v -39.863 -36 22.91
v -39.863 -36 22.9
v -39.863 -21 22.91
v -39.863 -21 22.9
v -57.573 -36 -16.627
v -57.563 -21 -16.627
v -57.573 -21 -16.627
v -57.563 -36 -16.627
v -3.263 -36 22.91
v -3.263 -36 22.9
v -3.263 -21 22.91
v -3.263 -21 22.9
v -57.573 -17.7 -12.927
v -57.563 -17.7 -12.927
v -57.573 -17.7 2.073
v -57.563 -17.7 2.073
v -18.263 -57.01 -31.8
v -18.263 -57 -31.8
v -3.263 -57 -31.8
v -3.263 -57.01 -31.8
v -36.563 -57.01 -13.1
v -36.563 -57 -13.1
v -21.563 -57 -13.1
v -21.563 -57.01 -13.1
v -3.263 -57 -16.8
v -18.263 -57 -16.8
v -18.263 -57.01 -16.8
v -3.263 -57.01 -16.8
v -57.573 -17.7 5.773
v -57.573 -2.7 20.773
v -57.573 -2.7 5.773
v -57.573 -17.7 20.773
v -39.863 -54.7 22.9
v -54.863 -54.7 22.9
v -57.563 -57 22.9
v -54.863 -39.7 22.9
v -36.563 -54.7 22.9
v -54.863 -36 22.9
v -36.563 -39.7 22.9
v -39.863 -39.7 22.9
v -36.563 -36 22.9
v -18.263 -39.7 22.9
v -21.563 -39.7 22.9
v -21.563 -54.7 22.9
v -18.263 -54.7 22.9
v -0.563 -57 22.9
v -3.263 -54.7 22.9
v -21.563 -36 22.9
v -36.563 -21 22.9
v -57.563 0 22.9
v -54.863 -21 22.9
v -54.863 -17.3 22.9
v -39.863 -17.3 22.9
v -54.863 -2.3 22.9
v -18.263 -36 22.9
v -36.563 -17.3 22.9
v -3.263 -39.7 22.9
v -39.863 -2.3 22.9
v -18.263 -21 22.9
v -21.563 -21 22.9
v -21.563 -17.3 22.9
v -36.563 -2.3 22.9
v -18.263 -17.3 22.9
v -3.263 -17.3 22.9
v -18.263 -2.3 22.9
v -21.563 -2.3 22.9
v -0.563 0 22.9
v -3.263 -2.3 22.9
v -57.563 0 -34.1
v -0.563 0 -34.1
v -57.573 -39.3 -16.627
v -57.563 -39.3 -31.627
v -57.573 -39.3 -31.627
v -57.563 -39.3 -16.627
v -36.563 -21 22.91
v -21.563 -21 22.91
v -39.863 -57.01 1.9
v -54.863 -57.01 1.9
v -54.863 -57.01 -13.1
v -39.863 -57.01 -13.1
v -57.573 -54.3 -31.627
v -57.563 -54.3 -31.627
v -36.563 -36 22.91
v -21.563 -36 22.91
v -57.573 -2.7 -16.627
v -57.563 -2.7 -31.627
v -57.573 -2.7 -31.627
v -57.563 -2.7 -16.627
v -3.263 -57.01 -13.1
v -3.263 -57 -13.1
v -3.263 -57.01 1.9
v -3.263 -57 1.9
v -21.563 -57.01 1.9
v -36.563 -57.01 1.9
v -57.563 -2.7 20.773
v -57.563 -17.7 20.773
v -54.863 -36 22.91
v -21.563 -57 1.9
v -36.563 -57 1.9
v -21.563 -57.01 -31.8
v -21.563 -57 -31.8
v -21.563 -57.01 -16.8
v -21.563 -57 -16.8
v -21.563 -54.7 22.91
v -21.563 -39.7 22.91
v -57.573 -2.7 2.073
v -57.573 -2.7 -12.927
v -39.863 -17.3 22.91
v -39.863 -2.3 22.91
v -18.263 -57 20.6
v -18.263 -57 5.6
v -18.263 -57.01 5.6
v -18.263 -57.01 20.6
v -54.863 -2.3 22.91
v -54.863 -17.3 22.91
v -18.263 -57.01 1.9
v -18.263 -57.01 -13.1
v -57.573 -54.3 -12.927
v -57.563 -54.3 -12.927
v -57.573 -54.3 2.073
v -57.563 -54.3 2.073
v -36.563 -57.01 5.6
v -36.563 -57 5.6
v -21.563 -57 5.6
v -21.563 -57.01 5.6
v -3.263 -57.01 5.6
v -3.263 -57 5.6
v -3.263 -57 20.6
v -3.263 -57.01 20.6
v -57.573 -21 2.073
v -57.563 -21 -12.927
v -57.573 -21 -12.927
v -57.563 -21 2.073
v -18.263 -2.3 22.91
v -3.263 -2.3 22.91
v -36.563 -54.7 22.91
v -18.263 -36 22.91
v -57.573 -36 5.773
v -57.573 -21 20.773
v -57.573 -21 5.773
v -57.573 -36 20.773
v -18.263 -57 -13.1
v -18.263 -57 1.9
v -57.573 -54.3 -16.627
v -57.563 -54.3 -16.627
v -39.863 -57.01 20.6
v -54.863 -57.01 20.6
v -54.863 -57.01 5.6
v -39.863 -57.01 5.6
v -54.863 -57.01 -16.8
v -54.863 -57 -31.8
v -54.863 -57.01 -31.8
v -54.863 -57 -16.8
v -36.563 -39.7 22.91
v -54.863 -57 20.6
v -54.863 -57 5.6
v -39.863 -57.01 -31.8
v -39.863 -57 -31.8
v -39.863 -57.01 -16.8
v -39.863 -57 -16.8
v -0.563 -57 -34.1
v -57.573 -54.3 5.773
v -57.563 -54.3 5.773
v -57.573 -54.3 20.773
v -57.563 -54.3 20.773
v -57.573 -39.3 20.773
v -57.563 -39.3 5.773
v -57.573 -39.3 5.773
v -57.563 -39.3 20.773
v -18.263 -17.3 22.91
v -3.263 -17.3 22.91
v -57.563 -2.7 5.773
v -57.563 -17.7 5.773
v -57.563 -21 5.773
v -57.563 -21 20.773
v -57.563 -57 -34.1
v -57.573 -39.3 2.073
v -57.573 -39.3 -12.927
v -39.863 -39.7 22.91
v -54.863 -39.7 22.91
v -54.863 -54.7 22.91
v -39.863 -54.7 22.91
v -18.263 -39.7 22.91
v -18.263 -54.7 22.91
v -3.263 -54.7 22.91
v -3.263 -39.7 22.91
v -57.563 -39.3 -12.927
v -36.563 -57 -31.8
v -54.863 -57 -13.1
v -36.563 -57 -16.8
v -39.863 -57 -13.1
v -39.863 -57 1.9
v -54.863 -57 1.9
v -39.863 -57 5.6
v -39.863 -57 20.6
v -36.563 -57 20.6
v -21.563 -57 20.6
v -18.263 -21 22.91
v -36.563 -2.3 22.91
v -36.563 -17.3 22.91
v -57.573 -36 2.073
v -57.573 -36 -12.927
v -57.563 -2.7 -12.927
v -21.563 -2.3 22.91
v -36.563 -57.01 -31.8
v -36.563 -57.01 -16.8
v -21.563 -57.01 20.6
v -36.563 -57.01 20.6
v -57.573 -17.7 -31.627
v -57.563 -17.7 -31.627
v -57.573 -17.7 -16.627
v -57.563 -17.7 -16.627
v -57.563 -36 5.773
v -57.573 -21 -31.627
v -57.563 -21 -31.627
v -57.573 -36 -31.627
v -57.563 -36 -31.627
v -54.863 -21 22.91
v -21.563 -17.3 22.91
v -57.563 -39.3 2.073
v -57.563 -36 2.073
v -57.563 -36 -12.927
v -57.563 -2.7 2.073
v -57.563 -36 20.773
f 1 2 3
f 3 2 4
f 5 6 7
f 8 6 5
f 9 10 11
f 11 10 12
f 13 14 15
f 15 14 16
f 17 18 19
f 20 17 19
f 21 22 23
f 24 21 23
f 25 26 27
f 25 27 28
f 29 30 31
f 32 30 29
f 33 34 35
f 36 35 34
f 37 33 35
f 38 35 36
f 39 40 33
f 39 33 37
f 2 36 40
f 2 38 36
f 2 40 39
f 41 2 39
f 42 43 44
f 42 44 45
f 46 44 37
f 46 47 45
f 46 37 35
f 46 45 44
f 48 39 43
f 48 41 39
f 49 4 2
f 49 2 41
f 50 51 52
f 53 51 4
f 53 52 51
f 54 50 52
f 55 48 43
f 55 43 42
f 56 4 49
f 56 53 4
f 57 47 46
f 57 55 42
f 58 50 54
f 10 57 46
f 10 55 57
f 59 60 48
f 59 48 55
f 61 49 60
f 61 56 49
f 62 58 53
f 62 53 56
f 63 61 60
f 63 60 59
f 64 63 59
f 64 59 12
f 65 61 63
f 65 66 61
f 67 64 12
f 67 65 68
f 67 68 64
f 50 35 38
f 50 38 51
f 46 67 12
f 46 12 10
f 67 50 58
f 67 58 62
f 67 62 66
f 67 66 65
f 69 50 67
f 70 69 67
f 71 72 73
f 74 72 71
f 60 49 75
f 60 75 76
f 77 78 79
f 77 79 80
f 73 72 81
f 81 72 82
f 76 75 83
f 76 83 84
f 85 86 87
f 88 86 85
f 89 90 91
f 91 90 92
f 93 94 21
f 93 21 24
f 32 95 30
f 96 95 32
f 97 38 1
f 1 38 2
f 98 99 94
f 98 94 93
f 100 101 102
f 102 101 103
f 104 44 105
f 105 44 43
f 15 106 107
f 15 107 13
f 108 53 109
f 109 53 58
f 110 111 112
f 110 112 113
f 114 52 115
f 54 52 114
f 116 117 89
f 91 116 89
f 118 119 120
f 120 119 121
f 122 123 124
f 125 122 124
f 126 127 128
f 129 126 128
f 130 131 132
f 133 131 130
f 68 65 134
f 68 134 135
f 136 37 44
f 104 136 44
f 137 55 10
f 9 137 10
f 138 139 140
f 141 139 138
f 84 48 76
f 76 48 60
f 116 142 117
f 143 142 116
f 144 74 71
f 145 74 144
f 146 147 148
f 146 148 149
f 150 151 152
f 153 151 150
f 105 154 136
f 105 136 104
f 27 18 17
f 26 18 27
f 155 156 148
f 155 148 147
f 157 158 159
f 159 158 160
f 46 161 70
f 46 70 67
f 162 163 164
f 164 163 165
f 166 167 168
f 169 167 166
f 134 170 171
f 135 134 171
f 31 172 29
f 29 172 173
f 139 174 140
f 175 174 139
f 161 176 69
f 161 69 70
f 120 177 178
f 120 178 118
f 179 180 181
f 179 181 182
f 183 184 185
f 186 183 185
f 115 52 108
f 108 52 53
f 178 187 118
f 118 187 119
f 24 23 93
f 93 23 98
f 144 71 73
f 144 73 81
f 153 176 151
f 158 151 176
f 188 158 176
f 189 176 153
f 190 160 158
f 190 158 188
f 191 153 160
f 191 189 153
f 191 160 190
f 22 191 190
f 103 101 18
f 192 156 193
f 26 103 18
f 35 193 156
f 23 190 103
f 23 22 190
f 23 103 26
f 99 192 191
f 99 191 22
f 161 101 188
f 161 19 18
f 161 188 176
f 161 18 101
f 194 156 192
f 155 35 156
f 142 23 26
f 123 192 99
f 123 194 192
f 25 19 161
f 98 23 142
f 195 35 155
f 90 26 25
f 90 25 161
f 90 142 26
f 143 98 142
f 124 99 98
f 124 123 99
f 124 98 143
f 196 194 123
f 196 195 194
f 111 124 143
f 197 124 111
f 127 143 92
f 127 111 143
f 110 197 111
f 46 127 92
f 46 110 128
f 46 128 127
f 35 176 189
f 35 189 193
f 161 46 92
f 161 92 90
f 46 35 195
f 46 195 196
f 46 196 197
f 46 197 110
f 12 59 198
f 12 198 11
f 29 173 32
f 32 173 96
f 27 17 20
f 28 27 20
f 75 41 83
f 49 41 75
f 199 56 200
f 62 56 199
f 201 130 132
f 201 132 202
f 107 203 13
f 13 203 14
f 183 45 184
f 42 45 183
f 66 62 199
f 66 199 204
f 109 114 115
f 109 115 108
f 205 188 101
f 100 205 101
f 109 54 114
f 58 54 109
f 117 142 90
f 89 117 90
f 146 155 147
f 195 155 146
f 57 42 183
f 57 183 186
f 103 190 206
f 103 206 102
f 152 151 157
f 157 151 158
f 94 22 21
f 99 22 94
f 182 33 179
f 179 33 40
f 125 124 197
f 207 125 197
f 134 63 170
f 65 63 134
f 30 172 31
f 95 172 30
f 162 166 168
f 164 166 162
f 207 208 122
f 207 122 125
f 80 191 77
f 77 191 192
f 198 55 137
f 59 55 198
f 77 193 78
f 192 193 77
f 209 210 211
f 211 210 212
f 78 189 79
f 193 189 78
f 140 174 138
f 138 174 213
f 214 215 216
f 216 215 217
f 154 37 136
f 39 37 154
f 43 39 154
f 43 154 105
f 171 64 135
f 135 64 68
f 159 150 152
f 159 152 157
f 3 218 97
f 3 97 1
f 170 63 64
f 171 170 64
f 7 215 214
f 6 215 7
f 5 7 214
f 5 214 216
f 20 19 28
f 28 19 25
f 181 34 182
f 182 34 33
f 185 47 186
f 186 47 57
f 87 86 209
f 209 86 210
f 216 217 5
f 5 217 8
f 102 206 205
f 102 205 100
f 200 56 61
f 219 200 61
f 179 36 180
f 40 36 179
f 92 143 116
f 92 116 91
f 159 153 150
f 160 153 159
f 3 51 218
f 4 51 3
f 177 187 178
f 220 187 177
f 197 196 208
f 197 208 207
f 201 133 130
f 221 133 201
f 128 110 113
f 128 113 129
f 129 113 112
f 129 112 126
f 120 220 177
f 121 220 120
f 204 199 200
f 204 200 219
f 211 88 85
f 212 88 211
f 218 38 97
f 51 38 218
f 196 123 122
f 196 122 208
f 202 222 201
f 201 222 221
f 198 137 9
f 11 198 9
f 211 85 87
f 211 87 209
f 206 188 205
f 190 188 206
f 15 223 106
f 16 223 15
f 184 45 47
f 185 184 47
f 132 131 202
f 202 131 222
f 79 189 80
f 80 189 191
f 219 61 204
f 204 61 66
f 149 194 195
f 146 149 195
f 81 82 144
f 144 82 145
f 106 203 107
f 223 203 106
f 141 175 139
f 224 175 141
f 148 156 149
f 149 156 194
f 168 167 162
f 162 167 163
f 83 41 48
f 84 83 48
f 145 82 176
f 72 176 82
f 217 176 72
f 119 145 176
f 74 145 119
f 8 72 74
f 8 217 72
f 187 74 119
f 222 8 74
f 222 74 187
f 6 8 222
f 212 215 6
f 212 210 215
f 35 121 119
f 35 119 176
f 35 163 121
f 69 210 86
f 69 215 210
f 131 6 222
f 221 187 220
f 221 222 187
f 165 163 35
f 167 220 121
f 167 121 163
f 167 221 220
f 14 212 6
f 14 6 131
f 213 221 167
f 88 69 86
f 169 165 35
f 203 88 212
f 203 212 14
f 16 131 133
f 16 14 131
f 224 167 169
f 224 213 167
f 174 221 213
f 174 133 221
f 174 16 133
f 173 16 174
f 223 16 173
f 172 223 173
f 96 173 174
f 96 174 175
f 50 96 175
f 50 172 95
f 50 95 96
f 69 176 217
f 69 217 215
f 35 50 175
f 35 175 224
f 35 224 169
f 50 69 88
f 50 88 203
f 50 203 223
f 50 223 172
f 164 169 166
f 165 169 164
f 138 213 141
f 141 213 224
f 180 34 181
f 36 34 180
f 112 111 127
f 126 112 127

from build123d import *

# Parameters (mm, degrees)
F0_W     = 57
F0_H     = 57
F1_DEPTH = 57
F2_W     = 15
F2_H     = 15
F3_DEPTH = 0.01
F4_W     = 15
F4_H     = 15
F5_DEPTH = 0.01
F6_W     = 15
F6_H     = 15
F7_DEPTH = 0.01


with BuildPart() as f1:
    # F0 (on Front) → F1 (new body)
    with BuildSketch(Plane.XZ):
        with Locations((-29.06329, -5.599806)):
            Rectangle(F0_W, F0_H)
    extrude(amount=F1_DEPTH)

    # F2 (on face) → F3 (join)
    with BuildSketch(Plane.XY.offset(22.900194)):
        with Locations((-10.76329, -9.8)):
            Rectangle(F2_W, F2_H)
        with Locations((-10.76329, -28.5)):
            Rectangle(F2_W, F2_H)
        with Locations((-10.76329, -47.2)):
            Rectangle(F2_W, F2_H)
        with Locations((-29.06329, -47.2)):
            Rectangle(F2_W, F2_H)
        with Locations((-29.06329, -28.5)):
            Rectangle(F2_W, F2_H)
        with Locations((-29.06329, -9.8)):
            Rectangle(F2_W, F2_H)
        with Locations((-47.36329, -47.2)):
            Rectangle(F2_W, F2_H)
        with Locations((-47.36329, -28.5)):
            Rectangle(F2_W, F2_H)
        with Locations((-47.36329, -9.8)):
            Rectangle(F2_W, F2_H)
    extrude(amount=F3_DEPTH)

    # F4 (on face) → F5 (join)
    with BuildSketch(Plane.XZ.offset(57)):
        with Locations((-10.76329, 13.100194)):
            Rectangle(F4_W, F4_H)
        with Locations((-10.76329, -5.599806)):
            Rectangle(F4_W, F4_H)
        with Locations((-10.76329, -24.299806)):
            Rectangle(F4_W, F4_H)
        with Locations((-29.06329, -24.299806)):
            Rectangle(F4_W, F4_H)
        with Locations((-29.06329, -5.599806)):
            Rectangle(F4_W, F4_H)
        with Locations((-29.06329, 13.100194)):
            Rectangle(F4_W, F4_H)
        with Locations((-47.36329, -24.299806)):
            Rectangle(F4_W, F4_H)
        with Locations((-47.36329, -5.599806)):
            Rectangle(F4_W, F4_H)
        with Locations((-47.36329, 13.100194)):
            Rectangle(F4_W, F4_H)
    extrude(amount=F5_DEPTH)

    # F6 (on face) → F7 (join)
    with BuildSketch(Plane(origin=(-57.56329, 0, 0), x_dir=(0, -1, 0), z_dir=(-1, 0, 0))):
        with Locations((46.8, 13.272529)):
            Rectangle(F6_W, F6_H)
        with Locations((46.8, -5.427471)):
            Rectangle(F6_W, F6_H)
        with Locations((46.8, -24.127471)):
            Rectangle(F6_W, F6_H)
        with Locations((28.5, -24.127471)):
            Rectangle(F6_W, F6_H)
        with Locations((28.5, -5.427471)):
            Rectangle(F6_W, F6_H)
        with Locations((28.5, 13.272529)):
            Rectangle(F6_W, F6_H)
        with Locations((10.2, -24.127471)):
            Rectangle(F6_W, F6_H)
        with Locations((10.2, -5.427471)):
            Rectangle(F6_W, F6_H)
        with Locations((10.2, 13.272529)):
            Rectangle(F6_W, F6_H)
    extrude(amount=F7_DEPTH)


solid = f1.part
